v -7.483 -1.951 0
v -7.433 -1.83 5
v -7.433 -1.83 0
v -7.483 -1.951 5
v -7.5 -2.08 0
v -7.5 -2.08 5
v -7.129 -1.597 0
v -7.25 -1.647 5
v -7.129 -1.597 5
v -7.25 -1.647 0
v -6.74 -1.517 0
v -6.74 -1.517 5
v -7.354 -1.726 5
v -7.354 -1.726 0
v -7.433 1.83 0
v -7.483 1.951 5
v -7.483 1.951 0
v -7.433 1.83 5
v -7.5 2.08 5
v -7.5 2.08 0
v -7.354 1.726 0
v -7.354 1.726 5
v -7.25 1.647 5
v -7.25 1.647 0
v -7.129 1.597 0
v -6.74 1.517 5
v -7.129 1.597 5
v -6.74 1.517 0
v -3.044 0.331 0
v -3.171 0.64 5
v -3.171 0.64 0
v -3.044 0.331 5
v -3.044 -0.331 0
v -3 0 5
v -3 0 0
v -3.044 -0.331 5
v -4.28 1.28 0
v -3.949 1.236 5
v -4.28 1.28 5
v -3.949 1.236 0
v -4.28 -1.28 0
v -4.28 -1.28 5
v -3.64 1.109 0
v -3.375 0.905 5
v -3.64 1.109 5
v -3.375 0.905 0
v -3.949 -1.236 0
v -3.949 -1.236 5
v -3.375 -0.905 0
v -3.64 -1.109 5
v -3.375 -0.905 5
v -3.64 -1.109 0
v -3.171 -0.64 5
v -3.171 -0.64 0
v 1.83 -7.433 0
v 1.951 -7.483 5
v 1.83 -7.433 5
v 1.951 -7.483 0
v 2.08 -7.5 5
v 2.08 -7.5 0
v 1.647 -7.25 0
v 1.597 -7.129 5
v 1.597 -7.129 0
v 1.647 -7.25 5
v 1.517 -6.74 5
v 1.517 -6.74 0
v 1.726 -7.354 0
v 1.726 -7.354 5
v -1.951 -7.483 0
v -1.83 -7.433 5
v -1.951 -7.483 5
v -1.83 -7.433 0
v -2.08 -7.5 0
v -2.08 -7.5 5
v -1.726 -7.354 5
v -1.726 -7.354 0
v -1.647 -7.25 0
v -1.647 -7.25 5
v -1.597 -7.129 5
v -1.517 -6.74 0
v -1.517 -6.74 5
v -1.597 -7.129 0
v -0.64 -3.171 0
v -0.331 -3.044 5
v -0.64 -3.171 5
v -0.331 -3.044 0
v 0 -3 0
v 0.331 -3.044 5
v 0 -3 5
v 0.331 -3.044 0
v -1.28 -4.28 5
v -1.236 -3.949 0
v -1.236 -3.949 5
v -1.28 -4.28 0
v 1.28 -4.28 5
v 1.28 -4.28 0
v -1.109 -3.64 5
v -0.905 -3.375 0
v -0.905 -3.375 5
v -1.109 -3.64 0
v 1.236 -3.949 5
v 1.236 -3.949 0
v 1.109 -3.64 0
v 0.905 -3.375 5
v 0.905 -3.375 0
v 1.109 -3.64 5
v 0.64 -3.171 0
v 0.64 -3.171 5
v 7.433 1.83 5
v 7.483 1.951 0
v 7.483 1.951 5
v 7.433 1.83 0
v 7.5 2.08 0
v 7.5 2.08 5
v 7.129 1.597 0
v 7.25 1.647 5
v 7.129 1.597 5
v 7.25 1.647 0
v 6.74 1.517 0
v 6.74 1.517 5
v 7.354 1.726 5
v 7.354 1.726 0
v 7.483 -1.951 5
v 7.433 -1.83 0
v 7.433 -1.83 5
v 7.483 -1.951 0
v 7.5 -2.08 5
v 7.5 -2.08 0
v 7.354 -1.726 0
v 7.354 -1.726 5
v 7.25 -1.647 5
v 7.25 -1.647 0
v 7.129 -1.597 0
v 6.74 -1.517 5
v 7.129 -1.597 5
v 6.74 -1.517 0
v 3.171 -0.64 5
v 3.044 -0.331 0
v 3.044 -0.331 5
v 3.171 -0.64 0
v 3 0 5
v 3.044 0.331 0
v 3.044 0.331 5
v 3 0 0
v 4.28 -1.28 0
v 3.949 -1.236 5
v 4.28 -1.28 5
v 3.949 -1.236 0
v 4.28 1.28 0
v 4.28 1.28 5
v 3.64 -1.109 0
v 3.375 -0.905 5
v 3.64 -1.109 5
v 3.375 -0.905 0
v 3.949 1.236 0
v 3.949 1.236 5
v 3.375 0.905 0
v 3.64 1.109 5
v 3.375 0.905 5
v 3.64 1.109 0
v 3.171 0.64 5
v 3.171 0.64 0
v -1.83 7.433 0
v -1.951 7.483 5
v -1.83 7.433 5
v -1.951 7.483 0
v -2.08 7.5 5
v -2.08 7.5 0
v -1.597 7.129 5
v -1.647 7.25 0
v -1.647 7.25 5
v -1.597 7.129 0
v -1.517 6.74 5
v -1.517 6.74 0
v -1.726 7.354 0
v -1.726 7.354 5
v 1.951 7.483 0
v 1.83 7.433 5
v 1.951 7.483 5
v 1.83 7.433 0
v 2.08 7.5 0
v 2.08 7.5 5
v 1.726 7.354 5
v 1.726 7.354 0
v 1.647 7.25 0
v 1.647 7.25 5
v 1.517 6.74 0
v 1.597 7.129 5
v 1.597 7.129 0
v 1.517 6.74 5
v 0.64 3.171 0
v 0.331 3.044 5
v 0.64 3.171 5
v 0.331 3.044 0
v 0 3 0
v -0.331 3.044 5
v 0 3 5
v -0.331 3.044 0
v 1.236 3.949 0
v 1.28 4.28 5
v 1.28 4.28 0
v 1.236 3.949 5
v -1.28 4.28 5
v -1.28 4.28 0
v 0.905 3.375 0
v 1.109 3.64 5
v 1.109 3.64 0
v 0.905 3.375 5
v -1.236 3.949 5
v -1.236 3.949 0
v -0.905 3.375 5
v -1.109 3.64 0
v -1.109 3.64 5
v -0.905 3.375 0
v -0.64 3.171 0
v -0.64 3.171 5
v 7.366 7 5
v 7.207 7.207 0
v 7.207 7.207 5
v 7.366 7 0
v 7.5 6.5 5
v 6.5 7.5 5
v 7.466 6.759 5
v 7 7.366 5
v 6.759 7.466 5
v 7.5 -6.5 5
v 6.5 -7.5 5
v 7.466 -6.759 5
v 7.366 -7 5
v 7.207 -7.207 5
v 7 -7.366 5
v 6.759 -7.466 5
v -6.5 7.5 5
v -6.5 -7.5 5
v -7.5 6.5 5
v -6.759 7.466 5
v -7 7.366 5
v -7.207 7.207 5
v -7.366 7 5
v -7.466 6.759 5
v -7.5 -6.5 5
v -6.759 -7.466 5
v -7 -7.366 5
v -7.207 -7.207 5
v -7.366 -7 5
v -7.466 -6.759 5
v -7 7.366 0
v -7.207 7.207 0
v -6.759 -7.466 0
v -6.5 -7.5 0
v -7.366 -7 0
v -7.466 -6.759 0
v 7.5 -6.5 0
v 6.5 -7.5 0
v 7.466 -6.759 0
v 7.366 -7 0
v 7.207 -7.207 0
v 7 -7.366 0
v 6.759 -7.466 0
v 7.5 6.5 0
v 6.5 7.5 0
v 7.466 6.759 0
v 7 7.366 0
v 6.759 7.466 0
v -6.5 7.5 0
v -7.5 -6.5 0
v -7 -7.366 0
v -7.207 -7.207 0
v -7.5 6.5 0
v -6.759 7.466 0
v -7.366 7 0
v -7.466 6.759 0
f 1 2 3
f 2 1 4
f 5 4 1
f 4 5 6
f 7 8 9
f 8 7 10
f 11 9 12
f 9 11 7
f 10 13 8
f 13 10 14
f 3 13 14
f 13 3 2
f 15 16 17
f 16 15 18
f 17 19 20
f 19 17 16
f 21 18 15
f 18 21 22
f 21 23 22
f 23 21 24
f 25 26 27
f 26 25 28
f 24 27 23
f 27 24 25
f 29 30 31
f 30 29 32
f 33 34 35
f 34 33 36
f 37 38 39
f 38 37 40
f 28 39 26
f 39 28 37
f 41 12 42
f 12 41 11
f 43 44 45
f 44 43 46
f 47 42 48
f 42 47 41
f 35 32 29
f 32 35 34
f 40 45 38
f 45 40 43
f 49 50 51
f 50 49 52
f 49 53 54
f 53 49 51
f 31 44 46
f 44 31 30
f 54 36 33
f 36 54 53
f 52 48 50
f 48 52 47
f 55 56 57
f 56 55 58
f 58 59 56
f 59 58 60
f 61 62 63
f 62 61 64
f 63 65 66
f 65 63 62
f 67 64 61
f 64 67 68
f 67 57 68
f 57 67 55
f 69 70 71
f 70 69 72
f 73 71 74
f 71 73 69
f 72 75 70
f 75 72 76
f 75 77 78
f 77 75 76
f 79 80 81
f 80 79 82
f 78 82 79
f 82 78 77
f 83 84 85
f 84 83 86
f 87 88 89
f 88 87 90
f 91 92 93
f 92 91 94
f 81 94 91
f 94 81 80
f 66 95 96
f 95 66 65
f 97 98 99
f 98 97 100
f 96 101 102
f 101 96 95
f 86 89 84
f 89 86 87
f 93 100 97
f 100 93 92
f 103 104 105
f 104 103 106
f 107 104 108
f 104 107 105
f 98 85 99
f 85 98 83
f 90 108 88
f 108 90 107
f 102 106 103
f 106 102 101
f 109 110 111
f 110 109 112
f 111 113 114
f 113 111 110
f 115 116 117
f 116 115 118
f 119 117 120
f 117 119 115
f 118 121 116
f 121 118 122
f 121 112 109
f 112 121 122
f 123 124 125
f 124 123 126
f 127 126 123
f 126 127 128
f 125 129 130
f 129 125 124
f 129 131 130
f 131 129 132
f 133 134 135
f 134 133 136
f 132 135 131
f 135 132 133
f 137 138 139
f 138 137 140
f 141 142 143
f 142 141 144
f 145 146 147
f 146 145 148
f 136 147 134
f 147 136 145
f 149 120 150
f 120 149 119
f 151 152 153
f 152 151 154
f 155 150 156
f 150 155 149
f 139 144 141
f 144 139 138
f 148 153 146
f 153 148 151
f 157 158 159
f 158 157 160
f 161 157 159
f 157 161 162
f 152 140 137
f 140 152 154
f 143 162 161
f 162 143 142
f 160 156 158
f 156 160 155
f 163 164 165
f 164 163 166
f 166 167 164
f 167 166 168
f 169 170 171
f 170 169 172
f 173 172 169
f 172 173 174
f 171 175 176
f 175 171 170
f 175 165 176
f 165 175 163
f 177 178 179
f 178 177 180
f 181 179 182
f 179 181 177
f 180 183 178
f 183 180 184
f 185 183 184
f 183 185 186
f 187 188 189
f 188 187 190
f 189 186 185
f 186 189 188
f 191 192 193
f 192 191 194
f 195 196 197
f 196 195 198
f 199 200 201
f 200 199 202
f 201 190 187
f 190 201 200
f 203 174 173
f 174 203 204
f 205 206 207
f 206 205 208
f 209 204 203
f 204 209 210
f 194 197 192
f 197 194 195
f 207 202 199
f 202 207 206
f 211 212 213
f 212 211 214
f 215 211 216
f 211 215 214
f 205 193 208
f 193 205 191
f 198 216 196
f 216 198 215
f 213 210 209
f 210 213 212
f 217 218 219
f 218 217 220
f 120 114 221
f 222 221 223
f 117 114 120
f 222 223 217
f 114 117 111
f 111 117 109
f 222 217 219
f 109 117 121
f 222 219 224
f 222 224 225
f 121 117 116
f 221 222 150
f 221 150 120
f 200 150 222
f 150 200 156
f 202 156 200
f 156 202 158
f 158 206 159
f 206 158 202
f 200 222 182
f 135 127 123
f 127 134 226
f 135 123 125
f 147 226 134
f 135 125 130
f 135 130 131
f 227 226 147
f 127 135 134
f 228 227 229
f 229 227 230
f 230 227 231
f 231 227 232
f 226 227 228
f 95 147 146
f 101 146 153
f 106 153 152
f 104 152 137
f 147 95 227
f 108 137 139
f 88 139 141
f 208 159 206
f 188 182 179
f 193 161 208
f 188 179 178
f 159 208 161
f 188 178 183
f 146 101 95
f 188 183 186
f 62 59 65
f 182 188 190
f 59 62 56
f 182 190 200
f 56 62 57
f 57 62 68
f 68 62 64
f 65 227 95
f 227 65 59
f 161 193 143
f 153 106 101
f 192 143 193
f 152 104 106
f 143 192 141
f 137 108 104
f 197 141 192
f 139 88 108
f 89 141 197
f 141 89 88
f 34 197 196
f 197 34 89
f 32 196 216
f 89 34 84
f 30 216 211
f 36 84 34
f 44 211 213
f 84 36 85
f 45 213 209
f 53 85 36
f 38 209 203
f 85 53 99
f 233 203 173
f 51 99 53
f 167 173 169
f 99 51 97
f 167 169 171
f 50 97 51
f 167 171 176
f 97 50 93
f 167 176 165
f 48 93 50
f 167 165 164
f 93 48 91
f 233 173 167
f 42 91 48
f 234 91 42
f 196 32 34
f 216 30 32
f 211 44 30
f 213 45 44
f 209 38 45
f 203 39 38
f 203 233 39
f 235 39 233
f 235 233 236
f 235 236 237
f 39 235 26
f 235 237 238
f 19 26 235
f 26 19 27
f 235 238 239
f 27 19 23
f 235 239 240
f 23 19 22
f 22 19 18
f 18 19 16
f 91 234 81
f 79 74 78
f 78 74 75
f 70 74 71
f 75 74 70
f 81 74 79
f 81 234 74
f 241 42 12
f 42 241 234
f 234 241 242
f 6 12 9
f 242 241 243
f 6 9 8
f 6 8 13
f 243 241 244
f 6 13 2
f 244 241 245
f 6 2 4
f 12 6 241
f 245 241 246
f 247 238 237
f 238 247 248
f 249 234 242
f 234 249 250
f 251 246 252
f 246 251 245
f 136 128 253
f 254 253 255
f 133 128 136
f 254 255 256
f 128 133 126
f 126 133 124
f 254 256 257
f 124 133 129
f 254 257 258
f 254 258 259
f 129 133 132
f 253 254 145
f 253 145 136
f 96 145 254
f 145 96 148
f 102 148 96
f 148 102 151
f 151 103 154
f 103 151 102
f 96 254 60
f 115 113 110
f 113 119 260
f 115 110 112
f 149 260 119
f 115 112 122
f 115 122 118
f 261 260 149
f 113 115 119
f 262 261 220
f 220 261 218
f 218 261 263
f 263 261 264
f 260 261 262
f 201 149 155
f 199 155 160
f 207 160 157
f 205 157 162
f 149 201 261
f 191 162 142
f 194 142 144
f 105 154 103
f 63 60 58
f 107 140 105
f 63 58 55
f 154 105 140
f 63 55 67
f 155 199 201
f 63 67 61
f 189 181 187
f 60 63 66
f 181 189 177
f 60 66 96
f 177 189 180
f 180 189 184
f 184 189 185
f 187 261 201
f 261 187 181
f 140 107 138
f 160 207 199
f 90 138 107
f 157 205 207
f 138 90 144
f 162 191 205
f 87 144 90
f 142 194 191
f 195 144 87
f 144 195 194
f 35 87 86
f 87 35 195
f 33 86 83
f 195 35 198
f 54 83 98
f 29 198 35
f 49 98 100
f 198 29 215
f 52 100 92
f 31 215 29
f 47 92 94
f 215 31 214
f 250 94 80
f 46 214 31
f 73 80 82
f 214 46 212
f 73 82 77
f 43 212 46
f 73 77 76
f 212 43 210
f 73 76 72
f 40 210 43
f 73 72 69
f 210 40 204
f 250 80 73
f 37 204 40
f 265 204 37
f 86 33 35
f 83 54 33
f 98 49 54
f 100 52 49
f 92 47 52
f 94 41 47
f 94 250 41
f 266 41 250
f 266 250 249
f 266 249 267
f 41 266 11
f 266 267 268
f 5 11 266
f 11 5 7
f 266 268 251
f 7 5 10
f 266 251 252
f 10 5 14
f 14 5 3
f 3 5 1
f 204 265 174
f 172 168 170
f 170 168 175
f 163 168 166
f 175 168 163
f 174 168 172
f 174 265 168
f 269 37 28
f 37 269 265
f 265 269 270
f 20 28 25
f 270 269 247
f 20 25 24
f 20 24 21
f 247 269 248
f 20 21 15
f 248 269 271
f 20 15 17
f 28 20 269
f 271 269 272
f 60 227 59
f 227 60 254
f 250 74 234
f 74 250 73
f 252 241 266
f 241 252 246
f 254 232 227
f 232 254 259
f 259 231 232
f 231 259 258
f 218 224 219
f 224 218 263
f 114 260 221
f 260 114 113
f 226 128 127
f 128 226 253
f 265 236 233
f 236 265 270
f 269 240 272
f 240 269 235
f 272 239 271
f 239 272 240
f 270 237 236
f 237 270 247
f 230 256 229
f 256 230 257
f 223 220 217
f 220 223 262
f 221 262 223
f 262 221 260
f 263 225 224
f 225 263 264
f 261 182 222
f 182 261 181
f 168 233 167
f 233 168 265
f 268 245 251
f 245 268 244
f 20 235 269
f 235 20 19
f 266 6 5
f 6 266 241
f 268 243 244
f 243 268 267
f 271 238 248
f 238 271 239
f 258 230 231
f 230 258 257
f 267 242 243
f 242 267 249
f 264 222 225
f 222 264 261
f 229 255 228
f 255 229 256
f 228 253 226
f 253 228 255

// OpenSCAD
module slotT1(w,rs,re,len) {
$fn=24;
  hull() {
    translate([-w/2+re,-rs-re+.2,0]) cylinder(r=re,h=len);
    translate([   -1   , -8  ,0]) cube([1,8-rs+1.45,len]);
    translate([-w/2-0.5,-10  ,0]) cube([w/2,1,len]);
  }
}

module slotT(len) {
rs=3.56/2;
w=15;
d=5;
re=0.5;
$fn=24;
  difference() {
    translate([-w/2-2,-9,0]) cube([w/2+2,18,len]);

    translate([0,0,-1]) difference() {
      union() {
        translate([-w/2+d-rs,-10,0]) cube([6,20,len+2]);
        slotT1(w,rs,re,len+2);
        mirror([0,1,0]) slotT1(w,rs,re,len+2);
      }

      translate([-w/2, 0 ,-1]) hull() {
        translate([d-rs,0,0]) cylinder(r=rs-0.5,h=len+2);
        translate([0,-rs+.2,0]) cube([0.1,2*rs-.4,len+2]);
      }
    }
  }
}

module ext15(len) {
w=15;
//sw = 3;
ro=1;
$fn=24;
  difference() {
    hull() {
      translate([-w/2+ro,-w/2+ro,0]) cylinder(r=ro,h=len);
      translate([-w/2+ro, w/2-ro,0]) cylinder(r=ro,h=len);
      translate([ w/2-ro, w/2-ro,0]) cylinder(r=ro,h=len);
      translate([ w/2-ro,-w/2+ro,0]) cylinder(r=ro,h=len);
    }

    translate([0,0,-1]) {
      for (a=[0,90,180,270]) {
        rotate([0,0,a])
          slotT(len+2);
      }
    }
  }
}

ext15(5);
